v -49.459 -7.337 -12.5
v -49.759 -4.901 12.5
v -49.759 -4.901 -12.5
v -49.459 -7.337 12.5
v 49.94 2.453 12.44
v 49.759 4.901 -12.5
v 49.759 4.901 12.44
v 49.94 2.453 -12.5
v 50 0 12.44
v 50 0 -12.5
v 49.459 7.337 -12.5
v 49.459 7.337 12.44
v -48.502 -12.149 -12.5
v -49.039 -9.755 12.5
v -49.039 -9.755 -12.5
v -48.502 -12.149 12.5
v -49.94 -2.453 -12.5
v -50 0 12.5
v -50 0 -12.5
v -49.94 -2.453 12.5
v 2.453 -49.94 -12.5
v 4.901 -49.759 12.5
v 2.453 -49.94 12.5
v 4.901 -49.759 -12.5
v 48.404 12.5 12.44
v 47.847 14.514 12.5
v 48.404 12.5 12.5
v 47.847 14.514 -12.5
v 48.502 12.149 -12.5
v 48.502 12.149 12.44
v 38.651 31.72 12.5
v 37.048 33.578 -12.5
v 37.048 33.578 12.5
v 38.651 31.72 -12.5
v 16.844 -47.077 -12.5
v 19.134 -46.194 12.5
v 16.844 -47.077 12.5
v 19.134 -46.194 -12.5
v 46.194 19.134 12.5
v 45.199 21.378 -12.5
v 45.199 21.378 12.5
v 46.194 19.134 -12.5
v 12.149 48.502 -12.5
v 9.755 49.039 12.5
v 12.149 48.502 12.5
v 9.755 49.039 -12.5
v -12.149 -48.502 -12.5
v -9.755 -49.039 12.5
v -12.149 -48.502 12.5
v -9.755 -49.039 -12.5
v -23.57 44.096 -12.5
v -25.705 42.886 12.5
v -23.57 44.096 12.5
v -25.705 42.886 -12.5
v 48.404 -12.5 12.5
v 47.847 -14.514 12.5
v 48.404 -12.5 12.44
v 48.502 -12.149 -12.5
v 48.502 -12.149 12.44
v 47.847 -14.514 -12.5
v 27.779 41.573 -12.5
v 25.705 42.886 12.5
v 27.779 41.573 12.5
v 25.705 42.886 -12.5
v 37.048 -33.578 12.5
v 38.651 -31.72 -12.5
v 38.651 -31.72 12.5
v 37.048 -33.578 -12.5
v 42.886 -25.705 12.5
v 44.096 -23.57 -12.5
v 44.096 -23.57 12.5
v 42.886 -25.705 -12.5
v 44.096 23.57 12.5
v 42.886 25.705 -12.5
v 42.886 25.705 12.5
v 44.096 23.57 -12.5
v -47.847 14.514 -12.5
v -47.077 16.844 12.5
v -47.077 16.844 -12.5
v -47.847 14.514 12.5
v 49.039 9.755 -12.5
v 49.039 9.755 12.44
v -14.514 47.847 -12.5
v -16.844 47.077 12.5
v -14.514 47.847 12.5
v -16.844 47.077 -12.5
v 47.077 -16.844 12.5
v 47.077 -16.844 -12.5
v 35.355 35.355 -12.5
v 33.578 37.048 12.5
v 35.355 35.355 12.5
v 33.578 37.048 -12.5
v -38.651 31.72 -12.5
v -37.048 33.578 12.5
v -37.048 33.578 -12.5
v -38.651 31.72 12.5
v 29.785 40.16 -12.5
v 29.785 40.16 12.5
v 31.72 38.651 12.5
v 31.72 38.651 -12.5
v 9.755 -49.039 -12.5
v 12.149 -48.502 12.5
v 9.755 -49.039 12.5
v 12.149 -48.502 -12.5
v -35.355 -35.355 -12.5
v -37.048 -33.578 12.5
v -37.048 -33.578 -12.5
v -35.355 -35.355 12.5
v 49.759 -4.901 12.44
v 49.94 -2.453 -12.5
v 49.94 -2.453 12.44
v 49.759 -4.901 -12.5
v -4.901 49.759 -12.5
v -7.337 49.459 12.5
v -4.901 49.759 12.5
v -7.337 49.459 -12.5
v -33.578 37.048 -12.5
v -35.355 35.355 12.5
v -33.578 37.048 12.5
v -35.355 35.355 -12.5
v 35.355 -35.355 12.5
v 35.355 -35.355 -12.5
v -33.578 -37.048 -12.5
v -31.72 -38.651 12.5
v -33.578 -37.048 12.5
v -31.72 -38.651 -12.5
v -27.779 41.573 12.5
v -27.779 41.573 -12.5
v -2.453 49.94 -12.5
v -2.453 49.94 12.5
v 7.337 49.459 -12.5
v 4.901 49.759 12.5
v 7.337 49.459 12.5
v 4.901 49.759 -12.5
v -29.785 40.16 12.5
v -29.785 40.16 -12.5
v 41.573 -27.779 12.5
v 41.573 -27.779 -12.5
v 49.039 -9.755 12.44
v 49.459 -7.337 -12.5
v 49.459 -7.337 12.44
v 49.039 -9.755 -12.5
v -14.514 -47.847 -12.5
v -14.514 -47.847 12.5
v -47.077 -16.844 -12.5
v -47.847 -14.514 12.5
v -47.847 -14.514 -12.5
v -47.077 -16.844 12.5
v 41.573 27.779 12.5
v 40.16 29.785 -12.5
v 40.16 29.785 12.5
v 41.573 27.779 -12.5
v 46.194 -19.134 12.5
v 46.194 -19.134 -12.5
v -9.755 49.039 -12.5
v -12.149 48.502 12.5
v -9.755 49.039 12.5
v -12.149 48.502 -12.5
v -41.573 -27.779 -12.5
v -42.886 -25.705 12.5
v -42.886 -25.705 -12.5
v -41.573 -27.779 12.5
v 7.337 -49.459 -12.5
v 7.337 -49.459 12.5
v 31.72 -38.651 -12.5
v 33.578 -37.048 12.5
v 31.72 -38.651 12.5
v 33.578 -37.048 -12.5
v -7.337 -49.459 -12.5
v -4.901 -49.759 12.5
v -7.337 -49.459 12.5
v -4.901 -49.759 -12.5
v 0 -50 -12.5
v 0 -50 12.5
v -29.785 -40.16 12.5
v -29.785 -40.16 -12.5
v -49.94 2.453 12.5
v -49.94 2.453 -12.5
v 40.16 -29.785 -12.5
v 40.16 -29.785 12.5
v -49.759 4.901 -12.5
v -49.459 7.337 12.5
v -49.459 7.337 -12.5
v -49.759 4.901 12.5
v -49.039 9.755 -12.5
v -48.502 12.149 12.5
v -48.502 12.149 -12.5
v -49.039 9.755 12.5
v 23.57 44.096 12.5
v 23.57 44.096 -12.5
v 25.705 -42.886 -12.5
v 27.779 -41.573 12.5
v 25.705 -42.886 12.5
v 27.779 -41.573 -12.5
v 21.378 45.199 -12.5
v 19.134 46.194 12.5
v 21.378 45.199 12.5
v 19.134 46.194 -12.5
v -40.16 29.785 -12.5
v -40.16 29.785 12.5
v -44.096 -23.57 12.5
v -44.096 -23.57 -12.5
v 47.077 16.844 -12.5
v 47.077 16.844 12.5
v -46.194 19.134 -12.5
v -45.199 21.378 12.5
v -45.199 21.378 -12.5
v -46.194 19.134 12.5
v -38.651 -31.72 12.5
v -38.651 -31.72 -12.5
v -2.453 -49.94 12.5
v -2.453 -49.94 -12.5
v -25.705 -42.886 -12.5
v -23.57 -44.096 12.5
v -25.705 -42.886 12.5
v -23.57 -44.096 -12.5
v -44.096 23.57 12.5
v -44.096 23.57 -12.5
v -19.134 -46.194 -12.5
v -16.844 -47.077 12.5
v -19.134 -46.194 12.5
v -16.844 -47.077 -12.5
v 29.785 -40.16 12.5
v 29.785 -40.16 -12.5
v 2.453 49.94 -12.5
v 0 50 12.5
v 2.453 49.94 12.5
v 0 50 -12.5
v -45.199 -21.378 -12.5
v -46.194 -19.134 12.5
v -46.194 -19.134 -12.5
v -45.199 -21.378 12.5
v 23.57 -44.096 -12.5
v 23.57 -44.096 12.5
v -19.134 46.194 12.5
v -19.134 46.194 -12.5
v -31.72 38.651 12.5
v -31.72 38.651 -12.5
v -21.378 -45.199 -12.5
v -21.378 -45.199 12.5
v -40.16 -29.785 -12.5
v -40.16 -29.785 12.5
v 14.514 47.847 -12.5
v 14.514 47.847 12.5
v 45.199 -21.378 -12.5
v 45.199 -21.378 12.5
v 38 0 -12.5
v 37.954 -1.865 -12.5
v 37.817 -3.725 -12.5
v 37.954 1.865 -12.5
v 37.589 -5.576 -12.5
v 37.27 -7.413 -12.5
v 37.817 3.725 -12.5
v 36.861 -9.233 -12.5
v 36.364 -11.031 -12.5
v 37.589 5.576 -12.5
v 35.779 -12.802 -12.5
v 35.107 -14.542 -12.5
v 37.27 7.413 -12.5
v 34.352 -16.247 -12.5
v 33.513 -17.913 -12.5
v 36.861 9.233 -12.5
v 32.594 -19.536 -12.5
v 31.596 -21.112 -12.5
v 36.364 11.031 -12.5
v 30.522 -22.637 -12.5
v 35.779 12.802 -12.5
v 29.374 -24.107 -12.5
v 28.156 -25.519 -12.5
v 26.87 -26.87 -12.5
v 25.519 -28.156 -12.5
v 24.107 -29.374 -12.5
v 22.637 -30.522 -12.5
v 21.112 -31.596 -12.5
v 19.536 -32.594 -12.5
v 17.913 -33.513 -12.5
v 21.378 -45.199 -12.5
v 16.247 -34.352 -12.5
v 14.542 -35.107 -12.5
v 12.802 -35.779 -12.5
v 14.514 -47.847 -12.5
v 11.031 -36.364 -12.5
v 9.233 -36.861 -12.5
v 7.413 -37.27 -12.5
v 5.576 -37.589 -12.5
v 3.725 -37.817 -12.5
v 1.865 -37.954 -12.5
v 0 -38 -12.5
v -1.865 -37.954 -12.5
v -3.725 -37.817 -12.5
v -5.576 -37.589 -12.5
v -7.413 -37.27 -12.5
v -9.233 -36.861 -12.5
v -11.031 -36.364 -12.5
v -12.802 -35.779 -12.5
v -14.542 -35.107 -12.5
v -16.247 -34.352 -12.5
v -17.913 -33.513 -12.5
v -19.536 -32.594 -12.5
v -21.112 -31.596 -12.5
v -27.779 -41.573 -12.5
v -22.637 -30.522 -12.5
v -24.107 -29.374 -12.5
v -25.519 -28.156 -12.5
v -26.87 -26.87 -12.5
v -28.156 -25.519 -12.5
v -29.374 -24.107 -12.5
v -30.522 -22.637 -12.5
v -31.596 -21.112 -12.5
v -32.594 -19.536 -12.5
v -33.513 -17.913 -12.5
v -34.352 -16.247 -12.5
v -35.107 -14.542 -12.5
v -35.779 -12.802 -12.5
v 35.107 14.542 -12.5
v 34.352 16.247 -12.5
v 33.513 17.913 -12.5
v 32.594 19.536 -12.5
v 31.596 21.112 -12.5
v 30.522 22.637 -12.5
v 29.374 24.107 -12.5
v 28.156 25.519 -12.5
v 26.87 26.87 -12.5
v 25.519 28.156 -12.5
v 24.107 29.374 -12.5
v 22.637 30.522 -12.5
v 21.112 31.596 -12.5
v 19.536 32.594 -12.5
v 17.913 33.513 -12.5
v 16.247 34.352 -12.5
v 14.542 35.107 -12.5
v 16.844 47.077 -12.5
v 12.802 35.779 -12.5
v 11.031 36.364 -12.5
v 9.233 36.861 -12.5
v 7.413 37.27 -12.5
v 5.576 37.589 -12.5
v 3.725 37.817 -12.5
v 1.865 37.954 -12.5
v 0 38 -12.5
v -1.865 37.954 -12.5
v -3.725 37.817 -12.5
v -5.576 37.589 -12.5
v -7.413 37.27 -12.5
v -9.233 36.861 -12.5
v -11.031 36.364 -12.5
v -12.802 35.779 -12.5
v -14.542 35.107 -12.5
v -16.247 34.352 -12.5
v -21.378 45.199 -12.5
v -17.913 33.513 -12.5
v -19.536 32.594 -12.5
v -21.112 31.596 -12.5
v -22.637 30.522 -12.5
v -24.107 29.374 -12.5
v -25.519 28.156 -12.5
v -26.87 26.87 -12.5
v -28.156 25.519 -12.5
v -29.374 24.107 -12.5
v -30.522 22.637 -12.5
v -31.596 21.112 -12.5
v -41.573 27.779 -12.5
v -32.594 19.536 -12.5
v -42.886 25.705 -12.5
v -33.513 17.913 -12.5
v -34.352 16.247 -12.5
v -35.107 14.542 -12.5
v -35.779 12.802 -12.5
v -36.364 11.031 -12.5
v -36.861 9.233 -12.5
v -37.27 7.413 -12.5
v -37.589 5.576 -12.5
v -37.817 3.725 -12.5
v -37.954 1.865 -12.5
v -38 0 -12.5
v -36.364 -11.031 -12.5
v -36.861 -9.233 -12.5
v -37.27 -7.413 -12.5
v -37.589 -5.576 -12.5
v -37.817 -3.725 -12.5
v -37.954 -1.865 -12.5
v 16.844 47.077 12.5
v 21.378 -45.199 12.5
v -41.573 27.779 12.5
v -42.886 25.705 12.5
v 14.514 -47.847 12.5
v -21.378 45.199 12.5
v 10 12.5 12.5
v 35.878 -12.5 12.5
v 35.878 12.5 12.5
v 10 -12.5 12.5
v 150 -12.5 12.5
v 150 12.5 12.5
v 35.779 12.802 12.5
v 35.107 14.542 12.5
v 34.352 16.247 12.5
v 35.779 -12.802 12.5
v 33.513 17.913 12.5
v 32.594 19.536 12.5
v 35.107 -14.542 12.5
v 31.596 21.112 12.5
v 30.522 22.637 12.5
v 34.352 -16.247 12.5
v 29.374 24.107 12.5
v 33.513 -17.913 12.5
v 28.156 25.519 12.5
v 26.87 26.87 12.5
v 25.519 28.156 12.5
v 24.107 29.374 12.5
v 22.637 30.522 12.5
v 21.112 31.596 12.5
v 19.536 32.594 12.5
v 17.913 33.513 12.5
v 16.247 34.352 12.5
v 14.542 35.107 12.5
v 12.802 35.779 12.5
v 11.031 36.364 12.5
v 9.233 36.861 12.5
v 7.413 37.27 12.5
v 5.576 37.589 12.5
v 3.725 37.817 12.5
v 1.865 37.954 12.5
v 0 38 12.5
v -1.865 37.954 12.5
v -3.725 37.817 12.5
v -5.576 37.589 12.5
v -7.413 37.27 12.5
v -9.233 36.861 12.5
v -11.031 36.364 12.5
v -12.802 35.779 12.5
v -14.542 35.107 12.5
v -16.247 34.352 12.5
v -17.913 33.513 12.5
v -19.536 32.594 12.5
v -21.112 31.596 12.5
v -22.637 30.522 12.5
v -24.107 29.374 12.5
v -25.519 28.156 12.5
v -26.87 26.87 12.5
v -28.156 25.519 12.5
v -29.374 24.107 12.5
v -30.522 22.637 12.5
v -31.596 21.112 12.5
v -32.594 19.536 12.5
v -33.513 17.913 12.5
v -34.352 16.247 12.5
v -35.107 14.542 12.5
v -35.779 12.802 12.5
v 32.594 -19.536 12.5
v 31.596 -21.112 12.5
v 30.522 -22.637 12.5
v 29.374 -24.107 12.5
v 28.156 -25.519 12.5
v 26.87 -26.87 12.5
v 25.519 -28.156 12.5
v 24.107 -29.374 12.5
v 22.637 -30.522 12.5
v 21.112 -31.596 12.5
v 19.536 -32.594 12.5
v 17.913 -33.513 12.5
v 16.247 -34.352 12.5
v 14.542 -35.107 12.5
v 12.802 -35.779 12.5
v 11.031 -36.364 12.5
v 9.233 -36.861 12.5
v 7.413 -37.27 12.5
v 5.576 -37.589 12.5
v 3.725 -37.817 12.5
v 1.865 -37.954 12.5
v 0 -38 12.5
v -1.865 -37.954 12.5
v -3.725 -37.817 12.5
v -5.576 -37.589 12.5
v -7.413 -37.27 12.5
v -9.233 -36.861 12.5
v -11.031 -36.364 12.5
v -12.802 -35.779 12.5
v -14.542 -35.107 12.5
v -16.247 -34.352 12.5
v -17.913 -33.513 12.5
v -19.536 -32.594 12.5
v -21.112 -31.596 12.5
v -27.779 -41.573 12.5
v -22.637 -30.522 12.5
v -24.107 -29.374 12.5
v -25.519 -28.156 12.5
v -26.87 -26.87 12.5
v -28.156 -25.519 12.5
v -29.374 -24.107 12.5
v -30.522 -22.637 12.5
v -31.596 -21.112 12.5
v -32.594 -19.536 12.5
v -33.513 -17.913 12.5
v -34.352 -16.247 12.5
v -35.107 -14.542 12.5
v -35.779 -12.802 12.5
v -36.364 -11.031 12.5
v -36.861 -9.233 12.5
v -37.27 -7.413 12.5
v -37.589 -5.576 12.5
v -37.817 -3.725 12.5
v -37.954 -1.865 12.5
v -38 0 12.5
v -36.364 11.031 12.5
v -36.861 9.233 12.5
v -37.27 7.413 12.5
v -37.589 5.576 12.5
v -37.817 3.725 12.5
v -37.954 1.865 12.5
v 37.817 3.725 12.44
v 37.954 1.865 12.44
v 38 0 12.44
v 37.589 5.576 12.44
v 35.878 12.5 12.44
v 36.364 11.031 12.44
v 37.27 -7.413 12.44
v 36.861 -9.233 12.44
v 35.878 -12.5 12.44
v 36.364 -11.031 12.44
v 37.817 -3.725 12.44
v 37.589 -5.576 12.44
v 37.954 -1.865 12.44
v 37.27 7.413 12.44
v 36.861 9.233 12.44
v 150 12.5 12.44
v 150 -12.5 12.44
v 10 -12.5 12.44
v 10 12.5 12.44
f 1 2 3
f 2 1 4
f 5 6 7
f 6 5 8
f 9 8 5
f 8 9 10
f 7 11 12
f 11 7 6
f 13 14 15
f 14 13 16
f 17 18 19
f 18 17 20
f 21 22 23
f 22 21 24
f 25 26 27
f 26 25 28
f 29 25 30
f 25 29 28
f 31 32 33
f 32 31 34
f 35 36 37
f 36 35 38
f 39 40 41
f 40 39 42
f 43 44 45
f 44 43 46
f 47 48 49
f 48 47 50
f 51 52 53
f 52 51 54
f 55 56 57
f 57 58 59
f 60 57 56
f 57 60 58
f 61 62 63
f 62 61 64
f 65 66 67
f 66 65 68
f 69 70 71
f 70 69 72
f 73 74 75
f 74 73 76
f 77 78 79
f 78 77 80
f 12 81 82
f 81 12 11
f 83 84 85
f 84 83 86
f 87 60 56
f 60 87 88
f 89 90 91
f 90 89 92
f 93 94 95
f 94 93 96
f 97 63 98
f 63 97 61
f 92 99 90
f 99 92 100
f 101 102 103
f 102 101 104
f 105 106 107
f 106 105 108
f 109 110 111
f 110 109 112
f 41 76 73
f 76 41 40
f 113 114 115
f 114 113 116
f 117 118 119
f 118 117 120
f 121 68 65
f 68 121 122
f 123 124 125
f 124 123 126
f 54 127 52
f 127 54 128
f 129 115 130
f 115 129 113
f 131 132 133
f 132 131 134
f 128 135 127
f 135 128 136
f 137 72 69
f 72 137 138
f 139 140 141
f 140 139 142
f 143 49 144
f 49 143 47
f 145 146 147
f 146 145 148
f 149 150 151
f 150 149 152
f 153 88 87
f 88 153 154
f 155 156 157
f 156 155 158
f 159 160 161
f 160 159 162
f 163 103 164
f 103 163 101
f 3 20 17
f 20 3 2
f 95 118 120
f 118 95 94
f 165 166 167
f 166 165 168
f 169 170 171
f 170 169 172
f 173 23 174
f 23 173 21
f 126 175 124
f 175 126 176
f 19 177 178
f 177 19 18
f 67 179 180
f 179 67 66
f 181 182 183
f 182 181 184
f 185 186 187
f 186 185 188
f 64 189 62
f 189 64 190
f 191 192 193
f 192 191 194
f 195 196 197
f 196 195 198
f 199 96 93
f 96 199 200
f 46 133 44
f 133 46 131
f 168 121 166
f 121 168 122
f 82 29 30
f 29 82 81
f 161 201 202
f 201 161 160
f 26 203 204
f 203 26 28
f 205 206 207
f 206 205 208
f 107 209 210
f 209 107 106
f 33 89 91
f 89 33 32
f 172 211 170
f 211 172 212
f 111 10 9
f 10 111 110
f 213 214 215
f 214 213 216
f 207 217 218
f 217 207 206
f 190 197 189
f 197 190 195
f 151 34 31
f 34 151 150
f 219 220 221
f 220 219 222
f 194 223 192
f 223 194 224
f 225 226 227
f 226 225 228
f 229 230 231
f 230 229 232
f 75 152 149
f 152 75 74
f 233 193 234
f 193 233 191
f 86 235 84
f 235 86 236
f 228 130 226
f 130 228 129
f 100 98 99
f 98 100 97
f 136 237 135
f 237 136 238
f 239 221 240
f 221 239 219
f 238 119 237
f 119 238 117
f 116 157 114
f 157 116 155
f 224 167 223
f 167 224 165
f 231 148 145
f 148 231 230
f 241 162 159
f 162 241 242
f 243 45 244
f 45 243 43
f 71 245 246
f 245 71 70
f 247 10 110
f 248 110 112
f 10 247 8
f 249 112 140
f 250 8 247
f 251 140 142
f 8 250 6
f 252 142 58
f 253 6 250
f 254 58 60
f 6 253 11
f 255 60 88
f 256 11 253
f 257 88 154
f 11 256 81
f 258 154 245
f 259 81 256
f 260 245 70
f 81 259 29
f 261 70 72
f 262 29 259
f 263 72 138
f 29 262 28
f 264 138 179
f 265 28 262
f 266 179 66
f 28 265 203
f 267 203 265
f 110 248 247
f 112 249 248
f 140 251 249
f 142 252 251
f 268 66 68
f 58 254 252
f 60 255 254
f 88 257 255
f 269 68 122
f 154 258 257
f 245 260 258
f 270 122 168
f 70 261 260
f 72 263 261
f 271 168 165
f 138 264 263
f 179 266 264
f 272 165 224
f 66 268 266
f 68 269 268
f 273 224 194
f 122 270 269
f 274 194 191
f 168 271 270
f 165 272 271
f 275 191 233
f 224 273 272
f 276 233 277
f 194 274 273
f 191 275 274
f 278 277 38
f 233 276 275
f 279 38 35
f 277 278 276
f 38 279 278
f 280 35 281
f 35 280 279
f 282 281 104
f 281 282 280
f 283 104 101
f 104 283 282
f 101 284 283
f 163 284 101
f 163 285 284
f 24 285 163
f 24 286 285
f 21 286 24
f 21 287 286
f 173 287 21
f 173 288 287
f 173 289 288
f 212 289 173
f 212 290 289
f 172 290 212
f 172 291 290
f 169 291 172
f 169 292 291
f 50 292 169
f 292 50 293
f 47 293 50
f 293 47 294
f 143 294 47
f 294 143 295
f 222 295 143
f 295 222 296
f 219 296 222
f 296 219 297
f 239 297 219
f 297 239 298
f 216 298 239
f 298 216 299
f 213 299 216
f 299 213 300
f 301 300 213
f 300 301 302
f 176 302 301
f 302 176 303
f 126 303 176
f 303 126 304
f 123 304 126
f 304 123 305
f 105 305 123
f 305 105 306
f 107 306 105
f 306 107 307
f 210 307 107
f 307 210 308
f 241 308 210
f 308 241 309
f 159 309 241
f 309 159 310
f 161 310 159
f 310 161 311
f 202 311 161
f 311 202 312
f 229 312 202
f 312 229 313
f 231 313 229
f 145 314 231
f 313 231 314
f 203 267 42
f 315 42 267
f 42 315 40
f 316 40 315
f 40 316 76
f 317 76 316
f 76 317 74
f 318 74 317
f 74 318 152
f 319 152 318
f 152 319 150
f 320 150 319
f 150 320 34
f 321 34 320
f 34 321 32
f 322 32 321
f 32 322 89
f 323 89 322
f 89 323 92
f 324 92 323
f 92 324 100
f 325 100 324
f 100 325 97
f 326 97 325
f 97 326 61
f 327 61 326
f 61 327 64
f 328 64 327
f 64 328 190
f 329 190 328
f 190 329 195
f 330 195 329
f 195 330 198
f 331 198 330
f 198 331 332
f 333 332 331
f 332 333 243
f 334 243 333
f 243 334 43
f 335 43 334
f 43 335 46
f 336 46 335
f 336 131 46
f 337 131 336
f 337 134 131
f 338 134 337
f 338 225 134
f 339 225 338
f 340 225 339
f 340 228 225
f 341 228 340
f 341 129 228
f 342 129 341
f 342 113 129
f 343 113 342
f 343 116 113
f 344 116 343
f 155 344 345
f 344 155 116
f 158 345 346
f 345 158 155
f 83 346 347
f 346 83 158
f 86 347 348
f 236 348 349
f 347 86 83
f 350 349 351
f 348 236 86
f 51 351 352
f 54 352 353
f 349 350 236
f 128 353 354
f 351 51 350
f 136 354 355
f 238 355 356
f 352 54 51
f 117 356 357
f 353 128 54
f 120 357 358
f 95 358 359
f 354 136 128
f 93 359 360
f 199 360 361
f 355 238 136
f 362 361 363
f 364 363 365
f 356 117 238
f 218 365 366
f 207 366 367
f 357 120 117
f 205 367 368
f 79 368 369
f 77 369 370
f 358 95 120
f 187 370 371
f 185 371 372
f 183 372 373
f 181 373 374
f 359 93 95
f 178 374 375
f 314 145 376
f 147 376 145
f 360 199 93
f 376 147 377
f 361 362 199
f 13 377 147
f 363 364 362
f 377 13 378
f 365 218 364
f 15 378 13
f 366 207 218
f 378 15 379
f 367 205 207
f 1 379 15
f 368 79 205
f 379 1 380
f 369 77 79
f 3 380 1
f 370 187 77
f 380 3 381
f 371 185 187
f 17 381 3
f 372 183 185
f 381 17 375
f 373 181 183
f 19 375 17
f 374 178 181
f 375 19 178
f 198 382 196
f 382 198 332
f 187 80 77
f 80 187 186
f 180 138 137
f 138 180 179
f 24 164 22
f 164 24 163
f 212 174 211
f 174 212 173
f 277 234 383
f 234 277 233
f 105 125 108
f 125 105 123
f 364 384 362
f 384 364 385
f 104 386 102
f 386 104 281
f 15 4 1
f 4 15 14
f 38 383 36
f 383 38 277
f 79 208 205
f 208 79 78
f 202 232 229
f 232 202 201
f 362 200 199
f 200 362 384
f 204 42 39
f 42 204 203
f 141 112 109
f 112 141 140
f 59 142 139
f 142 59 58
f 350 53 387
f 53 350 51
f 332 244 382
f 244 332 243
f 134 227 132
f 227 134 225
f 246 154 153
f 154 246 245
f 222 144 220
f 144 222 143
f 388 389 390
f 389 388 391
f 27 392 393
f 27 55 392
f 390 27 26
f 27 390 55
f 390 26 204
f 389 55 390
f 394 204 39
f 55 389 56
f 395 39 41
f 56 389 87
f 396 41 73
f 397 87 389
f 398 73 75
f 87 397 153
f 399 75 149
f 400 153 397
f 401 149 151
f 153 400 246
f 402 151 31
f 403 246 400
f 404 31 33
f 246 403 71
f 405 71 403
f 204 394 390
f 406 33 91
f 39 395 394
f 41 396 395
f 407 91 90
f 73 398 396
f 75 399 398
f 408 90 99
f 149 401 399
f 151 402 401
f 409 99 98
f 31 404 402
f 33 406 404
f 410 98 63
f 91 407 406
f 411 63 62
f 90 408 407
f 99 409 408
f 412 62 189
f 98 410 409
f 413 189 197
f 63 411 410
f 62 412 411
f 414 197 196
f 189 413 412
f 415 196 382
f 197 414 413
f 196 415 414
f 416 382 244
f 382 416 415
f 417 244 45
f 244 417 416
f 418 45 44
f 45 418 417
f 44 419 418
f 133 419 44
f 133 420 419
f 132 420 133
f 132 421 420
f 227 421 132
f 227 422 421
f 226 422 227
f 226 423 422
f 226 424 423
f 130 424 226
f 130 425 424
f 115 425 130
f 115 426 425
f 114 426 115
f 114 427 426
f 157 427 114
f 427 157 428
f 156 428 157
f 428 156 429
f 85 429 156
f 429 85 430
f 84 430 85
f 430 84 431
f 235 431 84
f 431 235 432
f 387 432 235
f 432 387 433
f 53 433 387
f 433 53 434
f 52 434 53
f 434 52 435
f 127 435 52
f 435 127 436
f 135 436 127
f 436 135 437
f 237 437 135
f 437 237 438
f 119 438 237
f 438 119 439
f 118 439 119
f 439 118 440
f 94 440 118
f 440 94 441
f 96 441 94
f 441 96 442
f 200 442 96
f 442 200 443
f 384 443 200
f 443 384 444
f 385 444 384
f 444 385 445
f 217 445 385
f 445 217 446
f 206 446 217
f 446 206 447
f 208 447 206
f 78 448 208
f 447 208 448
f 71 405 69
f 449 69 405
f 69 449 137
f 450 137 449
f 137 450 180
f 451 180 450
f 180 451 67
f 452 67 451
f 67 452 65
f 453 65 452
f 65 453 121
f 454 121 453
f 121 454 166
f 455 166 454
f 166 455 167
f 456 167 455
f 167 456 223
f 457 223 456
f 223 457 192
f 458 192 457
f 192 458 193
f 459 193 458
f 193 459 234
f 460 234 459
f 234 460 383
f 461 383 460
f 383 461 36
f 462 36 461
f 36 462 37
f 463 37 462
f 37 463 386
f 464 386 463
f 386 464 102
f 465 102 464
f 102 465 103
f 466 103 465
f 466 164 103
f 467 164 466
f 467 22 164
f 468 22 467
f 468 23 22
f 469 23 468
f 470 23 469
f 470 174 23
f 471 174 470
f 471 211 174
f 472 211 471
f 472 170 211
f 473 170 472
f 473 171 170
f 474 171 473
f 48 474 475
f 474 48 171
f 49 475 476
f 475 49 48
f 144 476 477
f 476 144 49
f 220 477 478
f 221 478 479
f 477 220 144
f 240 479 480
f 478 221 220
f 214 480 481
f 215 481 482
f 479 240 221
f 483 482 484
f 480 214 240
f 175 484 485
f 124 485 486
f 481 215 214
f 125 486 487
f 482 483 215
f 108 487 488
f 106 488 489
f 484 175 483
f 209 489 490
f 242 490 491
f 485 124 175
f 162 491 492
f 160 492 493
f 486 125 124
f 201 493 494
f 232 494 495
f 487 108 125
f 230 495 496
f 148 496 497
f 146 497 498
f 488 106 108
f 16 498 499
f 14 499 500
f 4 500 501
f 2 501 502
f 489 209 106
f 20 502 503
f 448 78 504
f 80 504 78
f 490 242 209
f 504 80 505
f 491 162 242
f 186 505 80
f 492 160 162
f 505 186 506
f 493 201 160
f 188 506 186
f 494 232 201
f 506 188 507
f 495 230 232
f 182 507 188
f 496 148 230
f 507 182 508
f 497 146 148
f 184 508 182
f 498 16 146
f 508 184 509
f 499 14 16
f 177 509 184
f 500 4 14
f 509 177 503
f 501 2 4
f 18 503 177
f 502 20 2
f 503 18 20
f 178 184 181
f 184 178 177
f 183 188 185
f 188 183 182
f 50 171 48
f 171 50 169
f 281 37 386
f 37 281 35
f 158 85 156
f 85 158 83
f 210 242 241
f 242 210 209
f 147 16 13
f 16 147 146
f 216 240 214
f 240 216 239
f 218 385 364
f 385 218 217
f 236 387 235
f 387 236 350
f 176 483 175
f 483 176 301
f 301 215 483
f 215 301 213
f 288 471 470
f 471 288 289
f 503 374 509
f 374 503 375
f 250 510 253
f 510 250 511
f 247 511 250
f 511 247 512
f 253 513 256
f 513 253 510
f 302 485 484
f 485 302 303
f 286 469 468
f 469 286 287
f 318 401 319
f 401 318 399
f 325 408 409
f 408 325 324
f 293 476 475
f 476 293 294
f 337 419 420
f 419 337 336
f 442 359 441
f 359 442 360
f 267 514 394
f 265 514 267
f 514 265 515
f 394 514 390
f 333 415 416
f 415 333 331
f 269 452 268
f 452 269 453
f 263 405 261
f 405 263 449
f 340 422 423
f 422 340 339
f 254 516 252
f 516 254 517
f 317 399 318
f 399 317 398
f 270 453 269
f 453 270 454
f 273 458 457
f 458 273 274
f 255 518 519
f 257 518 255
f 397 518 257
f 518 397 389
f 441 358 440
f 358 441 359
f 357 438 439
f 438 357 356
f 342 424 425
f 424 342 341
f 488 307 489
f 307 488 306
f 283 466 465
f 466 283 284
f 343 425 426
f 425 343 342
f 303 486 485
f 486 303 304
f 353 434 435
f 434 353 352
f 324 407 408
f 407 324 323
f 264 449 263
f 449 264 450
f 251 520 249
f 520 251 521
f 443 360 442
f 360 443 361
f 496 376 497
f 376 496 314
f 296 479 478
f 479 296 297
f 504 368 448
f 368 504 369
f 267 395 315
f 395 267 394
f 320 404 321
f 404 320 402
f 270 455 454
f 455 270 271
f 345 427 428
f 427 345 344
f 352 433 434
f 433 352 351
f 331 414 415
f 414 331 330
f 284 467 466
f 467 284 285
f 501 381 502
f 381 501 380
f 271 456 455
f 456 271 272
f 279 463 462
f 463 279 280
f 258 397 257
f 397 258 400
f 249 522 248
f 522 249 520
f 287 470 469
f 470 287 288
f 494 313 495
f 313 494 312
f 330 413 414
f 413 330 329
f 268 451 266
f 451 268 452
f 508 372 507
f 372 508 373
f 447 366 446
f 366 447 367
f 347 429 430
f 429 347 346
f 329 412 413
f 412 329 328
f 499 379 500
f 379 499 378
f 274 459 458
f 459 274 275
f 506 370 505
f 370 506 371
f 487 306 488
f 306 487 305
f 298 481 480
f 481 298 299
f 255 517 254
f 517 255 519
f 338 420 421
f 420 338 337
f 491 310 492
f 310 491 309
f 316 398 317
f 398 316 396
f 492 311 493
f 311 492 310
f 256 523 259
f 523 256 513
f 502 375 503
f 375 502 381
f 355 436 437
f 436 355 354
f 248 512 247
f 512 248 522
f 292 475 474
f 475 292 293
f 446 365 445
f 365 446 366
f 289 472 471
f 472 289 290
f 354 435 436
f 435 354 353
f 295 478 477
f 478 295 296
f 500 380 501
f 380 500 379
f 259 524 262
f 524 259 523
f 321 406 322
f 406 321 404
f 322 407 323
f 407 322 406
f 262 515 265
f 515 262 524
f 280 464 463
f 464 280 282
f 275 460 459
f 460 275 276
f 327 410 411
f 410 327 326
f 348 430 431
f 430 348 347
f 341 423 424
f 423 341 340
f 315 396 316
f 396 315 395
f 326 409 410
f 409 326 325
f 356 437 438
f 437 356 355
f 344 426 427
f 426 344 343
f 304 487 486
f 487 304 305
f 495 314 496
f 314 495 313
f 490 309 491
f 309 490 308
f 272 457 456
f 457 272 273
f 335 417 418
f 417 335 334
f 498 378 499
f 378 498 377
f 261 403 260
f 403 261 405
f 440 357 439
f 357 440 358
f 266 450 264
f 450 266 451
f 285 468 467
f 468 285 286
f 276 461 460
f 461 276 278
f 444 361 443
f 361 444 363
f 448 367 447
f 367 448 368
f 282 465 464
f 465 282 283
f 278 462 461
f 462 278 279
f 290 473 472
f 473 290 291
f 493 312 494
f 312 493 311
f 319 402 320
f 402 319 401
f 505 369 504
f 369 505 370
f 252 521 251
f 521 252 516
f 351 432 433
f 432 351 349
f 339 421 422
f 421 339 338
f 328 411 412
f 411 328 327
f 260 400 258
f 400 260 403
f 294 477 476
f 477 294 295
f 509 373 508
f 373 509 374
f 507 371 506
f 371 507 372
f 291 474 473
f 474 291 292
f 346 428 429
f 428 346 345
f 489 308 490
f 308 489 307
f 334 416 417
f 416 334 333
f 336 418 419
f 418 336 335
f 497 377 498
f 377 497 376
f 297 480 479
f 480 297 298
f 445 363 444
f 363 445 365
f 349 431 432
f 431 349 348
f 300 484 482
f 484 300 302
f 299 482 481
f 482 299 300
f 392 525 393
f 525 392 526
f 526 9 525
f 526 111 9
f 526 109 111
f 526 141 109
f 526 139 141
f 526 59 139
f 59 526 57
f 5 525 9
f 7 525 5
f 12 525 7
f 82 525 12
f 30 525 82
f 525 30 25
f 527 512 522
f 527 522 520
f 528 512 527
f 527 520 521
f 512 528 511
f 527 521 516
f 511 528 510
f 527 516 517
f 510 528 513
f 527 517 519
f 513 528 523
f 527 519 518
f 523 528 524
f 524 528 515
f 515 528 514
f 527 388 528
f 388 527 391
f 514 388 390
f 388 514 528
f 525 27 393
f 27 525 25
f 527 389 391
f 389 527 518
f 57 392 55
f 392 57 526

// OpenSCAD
$fn=128;

module tape_roll(outer_d=100, inner_d=76, width=25) {
    difference() {
        cylinder(d=outer_d, h=width, center=true);
        cylinder(d=inner_d, h=width+2, center=true);
    }
}

module tape_sheet(length=120, width=25, thickness=0.06) {
    translate([0,0,0])
        cube([length, width, thickness], center=true);
}

module sellotape_tape() {
    union() {
        color([0.95,0.95,0.98,0.25]) tape_roll(outer_d=100, inner_d=76, width=25);
        translate([80,0,12.5-0.03])
            color([0.95,0.95,0.98,0.25]) tape_sheet(length=140, width=25, thickness=0.06);
    }
}

sellotape_tape();
